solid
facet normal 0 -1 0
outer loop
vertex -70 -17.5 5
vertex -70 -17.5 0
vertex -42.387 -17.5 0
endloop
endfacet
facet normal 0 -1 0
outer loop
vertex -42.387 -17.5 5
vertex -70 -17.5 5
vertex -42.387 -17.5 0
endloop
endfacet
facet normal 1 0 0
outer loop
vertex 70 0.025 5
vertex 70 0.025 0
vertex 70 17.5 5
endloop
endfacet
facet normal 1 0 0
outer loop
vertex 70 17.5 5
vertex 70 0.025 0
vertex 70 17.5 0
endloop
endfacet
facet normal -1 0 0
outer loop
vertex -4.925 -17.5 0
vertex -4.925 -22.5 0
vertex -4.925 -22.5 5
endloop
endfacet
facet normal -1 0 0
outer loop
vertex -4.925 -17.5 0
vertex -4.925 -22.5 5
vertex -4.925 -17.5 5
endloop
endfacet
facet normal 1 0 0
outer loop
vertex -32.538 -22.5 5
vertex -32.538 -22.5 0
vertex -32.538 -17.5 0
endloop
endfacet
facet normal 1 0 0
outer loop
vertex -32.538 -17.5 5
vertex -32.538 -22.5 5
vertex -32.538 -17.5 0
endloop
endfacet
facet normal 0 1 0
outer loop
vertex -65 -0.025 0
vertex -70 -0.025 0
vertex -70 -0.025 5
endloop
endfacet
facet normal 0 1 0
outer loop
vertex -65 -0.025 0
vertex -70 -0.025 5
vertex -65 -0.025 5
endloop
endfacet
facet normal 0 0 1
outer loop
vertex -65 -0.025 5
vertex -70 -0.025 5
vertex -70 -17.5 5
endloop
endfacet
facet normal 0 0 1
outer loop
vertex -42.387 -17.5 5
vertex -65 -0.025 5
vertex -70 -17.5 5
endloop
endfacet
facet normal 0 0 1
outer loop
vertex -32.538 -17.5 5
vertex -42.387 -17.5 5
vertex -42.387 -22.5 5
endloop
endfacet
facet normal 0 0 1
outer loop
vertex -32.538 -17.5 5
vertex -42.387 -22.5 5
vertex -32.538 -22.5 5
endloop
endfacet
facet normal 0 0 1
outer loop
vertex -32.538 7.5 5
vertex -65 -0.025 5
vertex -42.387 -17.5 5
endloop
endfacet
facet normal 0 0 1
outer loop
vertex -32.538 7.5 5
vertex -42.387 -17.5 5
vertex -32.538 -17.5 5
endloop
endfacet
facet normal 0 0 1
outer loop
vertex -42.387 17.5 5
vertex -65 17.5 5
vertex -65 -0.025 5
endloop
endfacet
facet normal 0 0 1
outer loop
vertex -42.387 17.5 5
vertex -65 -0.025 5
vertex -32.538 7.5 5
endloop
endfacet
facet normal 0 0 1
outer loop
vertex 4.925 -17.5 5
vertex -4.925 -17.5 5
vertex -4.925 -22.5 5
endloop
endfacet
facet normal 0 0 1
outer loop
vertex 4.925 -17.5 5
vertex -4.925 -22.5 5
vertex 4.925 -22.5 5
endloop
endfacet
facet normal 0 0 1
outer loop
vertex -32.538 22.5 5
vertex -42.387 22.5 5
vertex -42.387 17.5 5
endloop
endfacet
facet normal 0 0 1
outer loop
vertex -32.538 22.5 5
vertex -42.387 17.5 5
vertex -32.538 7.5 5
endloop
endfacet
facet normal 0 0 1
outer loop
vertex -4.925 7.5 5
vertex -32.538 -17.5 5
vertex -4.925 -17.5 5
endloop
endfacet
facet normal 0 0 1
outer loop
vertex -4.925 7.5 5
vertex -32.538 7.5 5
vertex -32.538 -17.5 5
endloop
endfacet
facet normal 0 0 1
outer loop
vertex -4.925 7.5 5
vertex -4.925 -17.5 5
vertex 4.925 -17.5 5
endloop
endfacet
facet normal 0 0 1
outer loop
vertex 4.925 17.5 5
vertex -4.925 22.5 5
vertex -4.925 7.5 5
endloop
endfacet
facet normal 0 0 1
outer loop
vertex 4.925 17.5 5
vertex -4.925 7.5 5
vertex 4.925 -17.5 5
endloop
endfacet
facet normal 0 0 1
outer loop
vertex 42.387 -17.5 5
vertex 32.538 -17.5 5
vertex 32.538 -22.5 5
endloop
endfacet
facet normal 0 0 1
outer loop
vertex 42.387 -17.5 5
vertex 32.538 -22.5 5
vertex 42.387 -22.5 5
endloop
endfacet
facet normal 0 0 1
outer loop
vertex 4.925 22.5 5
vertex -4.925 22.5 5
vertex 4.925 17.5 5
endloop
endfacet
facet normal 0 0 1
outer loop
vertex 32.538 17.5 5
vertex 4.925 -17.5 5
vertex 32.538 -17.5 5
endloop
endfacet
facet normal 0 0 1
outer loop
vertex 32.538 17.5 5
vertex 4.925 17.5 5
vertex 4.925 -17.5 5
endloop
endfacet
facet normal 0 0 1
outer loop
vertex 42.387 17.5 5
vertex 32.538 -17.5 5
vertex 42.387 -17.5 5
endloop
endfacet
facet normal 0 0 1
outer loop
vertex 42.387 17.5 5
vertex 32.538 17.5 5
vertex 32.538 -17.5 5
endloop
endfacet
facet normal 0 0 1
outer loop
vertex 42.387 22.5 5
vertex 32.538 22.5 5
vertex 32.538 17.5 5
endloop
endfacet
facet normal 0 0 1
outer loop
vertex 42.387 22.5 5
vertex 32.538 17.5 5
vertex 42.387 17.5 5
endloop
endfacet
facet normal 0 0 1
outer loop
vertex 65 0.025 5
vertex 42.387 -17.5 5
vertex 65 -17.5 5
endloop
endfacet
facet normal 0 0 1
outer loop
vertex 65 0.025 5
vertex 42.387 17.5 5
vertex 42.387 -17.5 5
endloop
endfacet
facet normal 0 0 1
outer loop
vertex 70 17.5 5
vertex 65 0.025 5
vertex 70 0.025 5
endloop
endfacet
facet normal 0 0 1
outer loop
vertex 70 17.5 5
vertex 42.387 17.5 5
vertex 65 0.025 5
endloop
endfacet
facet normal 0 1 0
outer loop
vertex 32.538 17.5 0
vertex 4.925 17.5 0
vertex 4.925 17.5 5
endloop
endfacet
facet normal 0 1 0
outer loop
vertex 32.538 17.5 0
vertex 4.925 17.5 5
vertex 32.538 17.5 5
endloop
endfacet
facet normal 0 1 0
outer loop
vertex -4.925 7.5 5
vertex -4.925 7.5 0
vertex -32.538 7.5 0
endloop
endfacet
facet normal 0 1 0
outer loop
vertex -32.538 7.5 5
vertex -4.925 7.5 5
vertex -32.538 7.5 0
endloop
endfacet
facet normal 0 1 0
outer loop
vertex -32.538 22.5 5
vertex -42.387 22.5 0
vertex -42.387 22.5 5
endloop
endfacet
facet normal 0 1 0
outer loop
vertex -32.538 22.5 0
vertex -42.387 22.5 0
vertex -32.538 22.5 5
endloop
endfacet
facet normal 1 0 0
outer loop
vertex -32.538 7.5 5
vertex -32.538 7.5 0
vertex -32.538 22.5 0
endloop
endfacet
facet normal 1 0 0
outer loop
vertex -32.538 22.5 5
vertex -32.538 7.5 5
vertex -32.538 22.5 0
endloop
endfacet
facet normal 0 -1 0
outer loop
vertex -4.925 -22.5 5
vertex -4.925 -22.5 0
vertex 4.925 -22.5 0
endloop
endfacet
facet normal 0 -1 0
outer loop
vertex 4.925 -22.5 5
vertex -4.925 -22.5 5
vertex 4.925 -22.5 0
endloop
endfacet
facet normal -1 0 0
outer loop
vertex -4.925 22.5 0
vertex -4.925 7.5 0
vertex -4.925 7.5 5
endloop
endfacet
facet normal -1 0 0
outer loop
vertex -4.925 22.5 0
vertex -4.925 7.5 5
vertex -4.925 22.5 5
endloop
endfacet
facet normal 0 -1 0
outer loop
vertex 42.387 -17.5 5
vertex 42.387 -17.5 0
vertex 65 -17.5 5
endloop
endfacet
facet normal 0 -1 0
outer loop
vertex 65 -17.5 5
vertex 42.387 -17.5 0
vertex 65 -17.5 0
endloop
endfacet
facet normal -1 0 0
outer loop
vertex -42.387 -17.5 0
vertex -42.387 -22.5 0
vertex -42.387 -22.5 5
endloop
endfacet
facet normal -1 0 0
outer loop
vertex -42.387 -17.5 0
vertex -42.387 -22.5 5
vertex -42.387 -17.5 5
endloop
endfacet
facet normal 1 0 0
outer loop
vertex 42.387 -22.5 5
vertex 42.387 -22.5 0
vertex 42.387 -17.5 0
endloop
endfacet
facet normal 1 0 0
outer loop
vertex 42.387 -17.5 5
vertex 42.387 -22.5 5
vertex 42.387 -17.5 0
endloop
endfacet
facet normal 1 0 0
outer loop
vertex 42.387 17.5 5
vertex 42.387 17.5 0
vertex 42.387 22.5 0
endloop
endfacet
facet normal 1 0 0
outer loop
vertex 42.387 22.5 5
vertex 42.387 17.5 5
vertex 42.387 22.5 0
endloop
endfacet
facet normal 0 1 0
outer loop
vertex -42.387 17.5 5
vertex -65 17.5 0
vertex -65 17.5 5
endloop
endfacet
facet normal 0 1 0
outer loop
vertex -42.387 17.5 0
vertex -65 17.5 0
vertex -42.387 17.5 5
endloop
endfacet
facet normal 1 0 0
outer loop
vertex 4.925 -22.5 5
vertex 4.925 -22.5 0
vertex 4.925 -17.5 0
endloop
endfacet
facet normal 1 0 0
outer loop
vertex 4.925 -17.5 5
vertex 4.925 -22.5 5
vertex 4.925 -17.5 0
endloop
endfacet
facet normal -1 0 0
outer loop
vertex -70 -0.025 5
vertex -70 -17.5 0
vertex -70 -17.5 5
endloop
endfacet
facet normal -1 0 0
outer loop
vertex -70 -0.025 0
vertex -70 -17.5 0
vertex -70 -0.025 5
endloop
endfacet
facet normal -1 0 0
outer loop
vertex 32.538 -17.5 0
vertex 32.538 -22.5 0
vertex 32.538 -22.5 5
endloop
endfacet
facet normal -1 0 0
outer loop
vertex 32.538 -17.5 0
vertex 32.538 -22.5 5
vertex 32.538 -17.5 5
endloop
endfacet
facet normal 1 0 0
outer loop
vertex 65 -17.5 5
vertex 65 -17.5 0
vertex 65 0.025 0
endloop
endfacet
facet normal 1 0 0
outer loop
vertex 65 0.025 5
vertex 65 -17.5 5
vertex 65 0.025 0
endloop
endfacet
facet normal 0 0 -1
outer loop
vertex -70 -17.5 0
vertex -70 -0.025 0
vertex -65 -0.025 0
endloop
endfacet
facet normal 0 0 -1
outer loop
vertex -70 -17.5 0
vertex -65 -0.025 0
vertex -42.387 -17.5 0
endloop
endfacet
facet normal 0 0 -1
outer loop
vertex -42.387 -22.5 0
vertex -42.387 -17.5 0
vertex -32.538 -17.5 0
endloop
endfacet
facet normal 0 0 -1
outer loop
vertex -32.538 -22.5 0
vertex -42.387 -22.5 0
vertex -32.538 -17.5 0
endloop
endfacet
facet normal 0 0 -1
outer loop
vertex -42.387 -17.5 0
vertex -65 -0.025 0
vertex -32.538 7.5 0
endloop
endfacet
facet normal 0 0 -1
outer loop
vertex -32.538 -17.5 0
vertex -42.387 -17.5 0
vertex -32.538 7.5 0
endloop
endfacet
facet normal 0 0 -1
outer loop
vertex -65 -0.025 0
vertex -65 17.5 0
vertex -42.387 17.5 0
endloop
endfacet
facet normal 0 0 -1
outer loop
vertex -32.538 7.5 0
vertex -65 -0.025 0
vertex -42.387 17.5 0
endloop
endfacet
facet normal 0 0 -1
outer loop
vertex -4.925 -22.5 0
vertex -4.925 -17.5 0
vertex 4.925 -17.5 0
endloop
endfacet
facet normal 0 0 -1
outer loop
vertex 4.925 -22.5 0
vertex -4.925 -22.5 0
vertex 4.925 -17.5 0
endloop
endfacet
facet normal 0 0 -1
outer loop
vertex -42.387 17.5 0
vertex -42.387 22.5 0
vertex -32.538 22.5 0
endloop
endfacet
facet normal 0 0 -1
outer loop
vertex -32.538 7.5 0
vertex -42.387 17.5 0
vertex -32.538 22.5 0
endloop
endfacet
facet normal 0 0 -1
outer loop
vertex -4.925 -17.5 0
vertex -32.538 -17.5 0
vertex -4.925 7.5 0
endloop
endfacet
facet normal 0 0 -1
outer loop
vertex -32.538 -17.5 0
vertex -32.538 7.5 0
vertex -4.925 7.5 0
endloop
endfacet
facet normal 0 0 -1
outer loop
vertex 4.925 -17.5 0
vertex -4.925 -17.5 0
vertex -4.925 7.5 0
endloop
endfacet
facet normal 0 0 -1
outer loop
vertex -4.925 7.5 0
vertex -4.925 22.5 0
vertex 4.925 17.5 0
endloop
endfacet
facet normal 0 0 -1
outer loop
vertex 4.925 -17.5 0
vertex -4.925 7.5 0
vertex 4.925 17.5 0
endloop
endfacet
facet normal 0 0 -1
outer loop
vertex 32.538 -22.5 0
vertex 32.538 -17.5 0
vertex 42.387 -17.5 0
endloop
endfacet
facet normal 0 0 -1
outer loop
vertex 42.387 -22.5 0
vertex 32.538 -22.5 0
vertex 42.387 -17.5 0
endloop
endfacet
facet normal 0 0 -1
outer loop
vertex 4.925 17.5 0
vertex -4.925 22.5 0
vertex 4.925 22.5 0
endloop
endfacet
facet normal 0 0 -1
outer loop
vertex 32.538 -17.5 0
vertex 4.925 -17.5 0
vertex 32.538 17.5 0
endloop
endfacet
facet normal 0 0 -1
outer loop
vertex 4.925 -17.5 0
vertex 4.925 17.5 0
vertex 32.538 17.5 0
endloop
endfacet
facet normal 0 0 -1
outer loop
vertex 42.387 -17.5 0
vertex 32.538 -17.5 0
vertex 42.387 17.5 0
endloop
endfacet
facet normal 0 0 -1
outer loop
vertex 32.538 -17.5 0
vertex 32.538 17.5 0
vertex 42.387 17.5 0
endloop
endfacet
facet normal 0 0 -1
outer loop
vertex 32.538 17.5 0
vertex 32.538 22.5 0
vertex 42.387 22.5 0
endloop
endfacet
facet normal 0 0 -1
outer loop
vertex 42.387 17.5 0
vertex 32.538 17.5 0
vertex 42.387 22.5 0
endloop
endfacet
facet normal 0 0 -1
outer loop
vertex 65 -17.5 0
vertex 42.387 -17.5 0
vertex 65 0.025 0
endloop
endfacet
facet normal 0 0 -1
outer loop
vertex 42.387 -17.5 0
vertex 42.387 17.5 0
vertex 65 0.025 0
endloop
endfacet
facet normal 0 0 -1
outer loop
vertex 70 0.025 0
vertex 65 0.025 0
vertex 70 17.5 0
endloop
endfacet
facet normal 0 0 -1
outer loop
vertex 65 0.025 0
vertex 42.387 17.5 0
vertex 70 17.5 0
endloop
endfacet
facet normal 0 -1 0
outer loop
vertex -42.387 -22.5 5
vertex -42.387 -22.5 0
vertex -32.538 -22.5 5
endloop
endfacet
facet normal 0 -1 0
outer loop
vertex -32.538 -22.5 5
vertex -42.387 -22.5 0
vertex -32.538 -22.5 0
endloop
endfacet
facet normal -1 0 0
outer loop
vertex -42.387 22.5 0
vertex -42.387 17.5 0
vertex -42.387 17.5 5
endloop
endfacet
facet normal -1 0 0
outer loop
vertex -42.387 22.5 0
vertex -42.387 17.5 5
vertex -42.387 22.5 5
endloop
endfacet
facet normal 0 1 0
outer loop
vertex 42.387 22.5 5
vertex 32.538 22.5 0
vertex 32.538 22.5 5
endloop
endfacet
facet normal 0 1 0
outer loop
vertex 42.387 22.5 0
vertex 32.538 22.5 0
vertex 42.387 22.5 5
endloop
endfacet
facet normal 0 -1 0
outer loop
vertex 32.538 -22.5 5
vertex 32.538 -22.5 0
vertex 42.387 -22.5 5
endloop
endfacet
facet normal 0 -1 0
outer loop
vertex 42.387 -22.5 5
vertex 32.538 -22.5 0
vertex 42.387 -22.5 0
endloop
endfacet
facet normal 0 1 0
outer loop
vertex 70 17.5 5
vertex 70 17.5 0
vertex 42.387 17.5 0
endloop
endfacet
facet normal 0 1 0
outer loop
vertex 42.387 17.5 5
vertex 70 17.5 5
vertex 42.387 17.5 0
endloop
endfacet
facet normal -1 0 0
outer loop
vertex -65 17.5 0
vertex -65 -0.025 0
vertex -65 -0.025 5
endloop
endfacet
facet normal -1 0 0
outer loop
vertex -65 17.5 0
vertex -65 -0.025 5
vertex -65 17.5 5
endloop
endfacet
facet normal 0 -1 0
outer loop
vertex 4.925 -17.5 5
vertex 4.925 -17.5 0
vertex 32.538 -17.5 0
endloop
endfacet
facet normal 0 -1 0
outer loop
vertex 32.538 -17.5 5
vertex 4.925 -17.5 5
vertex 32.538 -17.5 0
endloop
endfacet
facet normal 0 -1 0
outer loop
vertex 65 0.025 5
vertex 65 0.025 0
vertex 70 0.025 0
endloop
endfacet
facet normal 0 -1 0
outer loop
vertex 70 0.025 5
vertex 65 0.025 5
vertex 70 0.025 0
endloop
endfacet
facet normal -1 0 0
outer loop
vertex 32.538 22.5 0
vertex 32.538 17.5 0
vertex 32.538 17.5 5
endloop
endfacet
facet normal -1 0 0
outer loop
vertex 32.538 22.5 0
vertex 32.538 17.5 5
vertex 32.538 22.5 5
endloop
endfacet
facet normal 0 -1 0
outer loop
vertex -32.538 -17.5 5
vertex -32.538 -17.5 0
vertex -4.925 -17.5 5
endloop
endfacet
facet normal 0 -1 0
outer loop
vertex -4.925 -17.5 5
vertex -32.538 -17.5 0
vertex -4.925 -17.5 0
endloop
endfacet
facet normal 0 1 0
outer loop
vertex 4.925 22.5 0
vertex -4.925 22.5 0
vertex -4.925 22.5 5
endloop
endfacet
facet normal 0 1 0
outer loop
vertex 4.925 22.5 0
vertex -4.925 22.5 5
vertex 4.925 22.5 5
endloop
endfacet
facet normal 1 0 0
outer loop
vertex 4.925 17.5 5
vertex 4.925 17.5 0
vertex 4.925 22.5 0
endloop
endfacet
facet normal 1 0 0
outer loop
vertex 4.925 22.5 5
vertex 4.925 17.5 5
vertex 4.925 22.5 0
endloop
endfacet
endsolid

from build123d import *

# Parameters (mm, degrees)
SKETCH2_W           = 130
SKETCH2_H           = 35
SKETCH2_W_2         = 5
SKETCH2_H_2         = 17.475
SKETCH2_W_3         = 9.85
SKETCH2_H_3         = 5
BOSS_EXTRUDE1_DEPTH = 5
SKETCH3_W           = 27.6125
SKETCH3_H           = 10
CUT_EXTRUDE1_DEPTH  = 74.697014865


with BuildPart() as part:
    # Sketch2 → Boss-Extrude1 (new body)
    with BuildSketch(Plane.XY):
        Rectangle(SKETCH2_W, SKETCH2_H)
        with Locations((-67.5, -8.7625)):
            Rectangle(SKETCH2_W_2, SKETCH2_H_2)
        with Locations((-37.4625, 20)):
            Rectangle(SKETCH2_W_3, SKETCH2_H_3)
        with Locations((0, 20)):
            Rectangle(SKETCH2_W_3, SKETCH2_H_3)
        with Locations((37.4625, 20)):
            Rectangle(SKETCH2_W_3, SKETCH2_H_3)
        with Locations((67.5, 8.7625)):
            Rectangle(SKETCH2_W_2, SKETCH2_H_2)
        with Locations((37.4625, -20)):
            Rectangle(SKETCH2_W_3, SKETCH2_H_3)
        with Locations((0, -20)):
            Rectangle(SKETCH2_W_3, SKETCH2_H_3)
        with Locations((-37.4625, -20)):
            Rectangle(SKETCH2_W_3, SKETCH2_H_3)
    extrude(amount=BOSS_EXTRUDE1_DEPTH)

    # Sketch3 → Cut-Extrude1 (cut, through all)
    with BuildSketch(Plane(origin=(0, 0, 0), x_dir=(-1, 0, 0), z_dir=(0, 0, -1))):
        with Locations((18.73125, 12.5)):
            Rectangle(SKETCH3_W, SKETCH3_H)
    extrude(amount=-CUT_EXTRUDE1_DEPTH, mode=Mode.SUBTRACT)


solid = part.part
